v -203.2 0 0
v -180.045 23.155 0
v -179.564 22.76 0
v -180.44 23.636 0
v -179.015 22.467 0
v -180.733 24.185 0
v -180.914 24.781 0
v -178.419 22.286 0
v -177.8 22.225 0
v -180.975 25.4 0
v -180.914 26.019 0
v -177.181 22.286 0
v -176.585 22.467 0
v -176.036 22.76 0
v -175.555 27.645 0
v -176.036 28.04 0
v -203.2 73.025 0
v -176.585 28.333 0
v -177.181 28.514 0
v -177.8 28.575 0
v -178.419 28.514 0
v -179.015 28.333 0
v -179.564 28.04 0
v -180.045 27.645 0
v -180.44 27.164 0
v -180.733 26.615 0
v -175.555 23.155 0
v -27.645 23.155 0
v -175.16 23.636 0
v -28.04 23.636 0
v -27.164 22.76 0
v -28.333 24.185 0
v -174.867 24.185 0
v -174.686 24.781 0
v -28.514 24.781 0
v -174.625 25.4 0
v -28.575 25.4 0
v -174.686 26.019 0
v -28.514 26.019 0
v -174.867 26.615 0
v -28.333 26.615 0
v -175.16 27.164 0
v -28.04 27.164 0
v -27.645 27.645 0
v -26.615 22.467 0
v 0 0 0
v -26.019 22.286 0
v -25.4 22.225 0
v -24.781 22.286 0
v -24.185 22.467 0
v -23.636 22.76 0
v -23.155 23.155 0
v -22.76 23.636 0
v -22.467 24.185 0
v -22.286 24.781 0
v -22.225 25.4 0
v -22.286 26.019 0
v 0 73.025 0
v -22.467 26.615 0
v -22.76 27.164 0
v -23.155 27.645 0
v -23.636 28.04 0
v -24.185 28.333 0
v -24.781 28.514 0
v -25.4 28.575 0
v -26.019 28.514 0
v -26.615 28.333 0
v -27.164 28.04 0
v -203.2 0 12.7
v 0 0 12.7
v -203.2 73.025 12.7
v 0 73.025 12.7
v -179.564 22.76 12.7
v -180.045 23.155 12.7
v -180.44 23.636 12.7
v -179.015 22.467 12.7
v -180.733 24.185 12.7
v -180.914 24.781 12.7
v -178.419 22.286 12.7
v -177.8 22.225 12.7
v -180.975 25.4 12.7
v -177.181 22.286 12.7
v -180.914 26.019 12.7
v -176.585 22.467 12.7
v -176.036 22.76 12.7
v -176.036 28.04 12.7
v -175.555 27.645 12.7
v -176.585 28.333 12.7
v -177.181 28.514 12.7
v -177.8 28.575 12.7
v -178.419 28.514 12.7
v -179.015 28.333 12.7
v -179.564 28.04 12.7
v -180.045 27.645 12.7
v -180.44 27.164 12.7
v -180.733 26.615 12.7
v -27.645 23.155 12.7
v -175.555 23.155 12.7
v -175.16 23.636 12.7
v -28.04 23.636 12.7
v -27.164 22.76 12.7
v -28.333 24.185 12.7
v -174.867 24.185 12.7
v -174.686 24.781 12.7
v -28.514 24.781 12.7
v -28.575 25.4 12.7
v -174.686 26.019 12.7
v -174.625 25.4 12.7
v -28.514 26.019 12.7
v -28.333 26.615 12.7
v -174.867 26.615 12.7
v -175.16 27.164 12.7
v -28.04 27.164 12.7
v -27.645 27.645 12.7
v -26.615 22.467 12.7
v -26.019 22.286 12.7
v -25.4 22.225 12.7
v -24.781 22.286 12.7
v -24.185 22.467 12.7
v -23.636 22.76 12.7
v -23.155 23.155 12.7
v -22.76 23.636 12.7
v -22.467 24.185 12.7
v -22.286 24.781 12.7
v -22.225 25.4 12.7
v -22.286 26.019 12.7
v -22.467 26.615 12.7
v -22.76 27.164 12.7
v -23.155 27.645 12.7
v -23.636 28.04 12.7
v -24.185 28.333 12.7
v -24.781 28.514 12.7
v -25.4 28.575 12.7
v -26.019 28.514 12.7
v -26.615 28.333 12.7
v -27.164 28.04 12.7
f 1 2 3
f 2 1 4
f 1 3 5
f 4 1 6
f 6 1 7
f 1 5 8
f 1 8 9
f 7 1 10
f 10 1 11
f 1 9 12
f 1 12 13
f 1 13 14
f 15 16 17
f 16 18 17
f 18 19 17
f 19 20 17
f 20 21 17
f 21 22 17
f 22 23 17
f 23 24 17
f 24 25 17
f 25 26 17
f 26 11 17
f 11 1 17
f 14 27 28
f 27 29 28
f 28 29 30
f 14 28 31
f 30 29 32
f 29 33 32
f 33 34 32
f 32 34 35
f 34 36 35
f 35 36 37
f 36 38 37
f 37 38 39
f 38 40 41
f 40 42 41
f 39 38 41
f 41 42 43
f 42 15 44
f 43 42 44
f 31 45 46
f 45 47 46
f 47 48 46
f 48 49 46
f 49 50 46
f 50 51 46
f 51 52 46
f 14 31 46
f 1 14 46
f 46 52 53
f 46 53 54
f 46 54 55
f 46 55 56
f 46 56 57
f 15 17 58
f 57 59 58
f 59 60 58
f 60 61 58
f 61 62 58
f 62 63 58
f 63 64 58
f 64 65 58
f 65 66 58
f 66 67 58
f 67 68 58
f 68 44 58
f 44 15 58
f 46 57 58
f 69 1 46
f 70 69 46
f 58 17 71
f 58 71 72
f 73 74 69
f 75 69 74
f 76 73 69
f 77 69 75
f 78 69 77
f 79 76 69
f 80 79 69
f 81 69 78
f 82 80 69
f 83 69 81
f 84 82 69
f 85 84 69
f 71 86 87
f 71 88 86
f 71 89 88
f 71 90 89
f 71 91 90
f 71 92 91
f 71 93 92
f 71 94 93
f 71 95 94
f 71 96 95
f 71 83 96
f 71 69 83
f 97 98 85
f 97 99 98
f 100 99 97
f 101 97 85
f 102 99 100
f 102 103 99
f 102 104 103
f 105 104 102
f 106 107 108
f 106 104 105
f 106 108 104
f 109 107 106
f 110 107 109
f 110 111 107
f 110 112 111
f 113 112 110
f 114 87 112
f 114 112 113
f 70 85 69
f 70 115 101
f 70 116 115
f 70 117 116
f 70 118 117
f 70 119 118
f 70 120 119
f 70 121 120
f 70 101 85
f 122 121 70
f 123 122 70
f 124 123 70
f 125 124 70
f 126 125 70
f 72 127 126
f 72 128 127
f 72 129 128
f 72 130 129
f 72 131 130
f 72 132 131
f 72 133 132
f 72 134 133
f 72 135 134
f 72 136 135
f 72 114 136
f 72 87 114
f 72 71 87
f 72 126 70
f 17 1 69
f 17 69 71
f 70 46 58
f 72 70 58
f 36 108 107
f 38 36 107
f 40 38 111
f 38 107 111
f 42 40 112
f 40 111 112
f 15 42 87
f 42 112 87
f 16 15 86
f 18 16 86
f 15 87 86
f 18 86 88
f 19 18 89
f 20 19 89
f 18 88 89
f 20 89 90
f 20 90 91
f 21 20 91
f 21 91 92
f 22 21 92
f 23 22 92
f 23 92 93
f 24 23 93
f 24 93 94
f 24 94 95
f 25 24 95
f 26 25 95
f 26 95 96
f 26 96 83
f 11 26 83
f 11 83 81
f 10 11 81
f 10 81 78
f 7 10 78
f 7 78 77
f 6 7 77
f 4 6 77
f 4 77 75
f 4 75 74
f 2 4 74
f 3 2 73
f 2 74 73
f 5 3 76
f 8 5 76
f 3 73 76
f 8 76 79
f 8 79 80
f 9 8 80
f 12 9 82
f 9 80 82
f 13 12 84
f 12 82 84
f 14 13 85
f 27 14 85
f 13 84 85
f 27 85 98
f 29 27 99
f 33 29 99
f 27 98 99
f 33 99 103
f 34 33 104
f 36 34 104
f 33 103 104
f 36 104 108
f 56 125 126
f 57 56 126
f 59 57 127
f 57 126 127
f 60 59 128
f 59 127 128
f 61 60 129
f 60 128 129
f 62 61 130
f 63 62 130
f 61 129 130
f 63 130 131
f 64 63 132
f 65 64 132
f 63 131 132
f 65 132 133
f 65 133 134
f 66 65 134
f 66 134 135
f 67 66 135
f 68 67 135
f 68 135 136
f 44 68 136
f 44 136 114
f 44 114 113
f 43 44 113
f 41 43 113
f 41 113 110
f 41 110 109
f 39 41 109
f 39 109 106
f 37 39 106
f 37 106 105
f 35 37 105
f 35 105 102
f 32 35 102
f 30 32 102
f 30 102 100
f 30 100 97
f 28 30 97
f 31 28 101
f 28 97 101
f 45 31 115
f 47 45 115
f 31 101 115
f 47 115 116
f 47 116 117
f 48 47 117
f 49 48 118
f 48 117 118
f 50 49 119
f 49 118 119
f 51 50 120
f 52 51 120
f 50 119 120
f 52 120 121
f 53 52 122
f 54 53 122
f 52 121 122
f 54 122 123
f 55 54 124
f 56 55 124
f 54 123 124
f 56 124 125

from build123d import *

# Parameters (mm, degrees)
F0_W     = 203.2
F0_H     = 73.025
F1_DEPTH = 12.7
F3_DEPTH = 25.4


with BuildPart() as f1:
    # F0 (on Top) → F1 (new body)
    with BuildSketch(Plane.XY):
        with Locations((-101.6, 36.5125)):
            Rectangle(F0_W, F0_H)
    extrude(amount=F1_DEPTH)

    # F2 (on face) → F3 (cut)
    with BuildSketch(Plane.XY.offset(12.7)):
        with BuildLine():
            Line((-177.8, 25.4), (-180.975, 25.4))
            ThreePointArc((-180.975, 25.4), (-177.8, 22.225), (-174.625, 25.4))
            Line((-174.625, 25.4), (-177.8, 25.4))
        make_face()
        with BuildLine():
            ThreePointArc((-174.625, 25.4), (-177.8, 28.575), (-180.975, 25.4))
            Line((-180.975, 25.4), (-177.8, 25.4))
            Line((-177.8, 25.4), (-174.625, 25.4))
        make_face()
        with BuildLine():
            ThreePointArc((-28.575, 25.4), (-25.4, 22.225), (-22.225, 25.4))
            Line((-22.225, 25.4), (-25.4, 25.4))
            Line((-25.4, 25.4), (-28.575, 25.4))
        make_face()
        with BuildLine():
            Line((-25.4, 25.4), (-22.225, 25.4))
            ThreePointArc((-22.225, 25.4), (-25.4, 28.575), (-28.575, 25.4))
            Line((-28.575, 25.4), (-25.4, 25.4))
        make_face()
    extrude(amount=-F3_DEPTH, mode=Mode.SUBTRACT)


solid = f1.part
